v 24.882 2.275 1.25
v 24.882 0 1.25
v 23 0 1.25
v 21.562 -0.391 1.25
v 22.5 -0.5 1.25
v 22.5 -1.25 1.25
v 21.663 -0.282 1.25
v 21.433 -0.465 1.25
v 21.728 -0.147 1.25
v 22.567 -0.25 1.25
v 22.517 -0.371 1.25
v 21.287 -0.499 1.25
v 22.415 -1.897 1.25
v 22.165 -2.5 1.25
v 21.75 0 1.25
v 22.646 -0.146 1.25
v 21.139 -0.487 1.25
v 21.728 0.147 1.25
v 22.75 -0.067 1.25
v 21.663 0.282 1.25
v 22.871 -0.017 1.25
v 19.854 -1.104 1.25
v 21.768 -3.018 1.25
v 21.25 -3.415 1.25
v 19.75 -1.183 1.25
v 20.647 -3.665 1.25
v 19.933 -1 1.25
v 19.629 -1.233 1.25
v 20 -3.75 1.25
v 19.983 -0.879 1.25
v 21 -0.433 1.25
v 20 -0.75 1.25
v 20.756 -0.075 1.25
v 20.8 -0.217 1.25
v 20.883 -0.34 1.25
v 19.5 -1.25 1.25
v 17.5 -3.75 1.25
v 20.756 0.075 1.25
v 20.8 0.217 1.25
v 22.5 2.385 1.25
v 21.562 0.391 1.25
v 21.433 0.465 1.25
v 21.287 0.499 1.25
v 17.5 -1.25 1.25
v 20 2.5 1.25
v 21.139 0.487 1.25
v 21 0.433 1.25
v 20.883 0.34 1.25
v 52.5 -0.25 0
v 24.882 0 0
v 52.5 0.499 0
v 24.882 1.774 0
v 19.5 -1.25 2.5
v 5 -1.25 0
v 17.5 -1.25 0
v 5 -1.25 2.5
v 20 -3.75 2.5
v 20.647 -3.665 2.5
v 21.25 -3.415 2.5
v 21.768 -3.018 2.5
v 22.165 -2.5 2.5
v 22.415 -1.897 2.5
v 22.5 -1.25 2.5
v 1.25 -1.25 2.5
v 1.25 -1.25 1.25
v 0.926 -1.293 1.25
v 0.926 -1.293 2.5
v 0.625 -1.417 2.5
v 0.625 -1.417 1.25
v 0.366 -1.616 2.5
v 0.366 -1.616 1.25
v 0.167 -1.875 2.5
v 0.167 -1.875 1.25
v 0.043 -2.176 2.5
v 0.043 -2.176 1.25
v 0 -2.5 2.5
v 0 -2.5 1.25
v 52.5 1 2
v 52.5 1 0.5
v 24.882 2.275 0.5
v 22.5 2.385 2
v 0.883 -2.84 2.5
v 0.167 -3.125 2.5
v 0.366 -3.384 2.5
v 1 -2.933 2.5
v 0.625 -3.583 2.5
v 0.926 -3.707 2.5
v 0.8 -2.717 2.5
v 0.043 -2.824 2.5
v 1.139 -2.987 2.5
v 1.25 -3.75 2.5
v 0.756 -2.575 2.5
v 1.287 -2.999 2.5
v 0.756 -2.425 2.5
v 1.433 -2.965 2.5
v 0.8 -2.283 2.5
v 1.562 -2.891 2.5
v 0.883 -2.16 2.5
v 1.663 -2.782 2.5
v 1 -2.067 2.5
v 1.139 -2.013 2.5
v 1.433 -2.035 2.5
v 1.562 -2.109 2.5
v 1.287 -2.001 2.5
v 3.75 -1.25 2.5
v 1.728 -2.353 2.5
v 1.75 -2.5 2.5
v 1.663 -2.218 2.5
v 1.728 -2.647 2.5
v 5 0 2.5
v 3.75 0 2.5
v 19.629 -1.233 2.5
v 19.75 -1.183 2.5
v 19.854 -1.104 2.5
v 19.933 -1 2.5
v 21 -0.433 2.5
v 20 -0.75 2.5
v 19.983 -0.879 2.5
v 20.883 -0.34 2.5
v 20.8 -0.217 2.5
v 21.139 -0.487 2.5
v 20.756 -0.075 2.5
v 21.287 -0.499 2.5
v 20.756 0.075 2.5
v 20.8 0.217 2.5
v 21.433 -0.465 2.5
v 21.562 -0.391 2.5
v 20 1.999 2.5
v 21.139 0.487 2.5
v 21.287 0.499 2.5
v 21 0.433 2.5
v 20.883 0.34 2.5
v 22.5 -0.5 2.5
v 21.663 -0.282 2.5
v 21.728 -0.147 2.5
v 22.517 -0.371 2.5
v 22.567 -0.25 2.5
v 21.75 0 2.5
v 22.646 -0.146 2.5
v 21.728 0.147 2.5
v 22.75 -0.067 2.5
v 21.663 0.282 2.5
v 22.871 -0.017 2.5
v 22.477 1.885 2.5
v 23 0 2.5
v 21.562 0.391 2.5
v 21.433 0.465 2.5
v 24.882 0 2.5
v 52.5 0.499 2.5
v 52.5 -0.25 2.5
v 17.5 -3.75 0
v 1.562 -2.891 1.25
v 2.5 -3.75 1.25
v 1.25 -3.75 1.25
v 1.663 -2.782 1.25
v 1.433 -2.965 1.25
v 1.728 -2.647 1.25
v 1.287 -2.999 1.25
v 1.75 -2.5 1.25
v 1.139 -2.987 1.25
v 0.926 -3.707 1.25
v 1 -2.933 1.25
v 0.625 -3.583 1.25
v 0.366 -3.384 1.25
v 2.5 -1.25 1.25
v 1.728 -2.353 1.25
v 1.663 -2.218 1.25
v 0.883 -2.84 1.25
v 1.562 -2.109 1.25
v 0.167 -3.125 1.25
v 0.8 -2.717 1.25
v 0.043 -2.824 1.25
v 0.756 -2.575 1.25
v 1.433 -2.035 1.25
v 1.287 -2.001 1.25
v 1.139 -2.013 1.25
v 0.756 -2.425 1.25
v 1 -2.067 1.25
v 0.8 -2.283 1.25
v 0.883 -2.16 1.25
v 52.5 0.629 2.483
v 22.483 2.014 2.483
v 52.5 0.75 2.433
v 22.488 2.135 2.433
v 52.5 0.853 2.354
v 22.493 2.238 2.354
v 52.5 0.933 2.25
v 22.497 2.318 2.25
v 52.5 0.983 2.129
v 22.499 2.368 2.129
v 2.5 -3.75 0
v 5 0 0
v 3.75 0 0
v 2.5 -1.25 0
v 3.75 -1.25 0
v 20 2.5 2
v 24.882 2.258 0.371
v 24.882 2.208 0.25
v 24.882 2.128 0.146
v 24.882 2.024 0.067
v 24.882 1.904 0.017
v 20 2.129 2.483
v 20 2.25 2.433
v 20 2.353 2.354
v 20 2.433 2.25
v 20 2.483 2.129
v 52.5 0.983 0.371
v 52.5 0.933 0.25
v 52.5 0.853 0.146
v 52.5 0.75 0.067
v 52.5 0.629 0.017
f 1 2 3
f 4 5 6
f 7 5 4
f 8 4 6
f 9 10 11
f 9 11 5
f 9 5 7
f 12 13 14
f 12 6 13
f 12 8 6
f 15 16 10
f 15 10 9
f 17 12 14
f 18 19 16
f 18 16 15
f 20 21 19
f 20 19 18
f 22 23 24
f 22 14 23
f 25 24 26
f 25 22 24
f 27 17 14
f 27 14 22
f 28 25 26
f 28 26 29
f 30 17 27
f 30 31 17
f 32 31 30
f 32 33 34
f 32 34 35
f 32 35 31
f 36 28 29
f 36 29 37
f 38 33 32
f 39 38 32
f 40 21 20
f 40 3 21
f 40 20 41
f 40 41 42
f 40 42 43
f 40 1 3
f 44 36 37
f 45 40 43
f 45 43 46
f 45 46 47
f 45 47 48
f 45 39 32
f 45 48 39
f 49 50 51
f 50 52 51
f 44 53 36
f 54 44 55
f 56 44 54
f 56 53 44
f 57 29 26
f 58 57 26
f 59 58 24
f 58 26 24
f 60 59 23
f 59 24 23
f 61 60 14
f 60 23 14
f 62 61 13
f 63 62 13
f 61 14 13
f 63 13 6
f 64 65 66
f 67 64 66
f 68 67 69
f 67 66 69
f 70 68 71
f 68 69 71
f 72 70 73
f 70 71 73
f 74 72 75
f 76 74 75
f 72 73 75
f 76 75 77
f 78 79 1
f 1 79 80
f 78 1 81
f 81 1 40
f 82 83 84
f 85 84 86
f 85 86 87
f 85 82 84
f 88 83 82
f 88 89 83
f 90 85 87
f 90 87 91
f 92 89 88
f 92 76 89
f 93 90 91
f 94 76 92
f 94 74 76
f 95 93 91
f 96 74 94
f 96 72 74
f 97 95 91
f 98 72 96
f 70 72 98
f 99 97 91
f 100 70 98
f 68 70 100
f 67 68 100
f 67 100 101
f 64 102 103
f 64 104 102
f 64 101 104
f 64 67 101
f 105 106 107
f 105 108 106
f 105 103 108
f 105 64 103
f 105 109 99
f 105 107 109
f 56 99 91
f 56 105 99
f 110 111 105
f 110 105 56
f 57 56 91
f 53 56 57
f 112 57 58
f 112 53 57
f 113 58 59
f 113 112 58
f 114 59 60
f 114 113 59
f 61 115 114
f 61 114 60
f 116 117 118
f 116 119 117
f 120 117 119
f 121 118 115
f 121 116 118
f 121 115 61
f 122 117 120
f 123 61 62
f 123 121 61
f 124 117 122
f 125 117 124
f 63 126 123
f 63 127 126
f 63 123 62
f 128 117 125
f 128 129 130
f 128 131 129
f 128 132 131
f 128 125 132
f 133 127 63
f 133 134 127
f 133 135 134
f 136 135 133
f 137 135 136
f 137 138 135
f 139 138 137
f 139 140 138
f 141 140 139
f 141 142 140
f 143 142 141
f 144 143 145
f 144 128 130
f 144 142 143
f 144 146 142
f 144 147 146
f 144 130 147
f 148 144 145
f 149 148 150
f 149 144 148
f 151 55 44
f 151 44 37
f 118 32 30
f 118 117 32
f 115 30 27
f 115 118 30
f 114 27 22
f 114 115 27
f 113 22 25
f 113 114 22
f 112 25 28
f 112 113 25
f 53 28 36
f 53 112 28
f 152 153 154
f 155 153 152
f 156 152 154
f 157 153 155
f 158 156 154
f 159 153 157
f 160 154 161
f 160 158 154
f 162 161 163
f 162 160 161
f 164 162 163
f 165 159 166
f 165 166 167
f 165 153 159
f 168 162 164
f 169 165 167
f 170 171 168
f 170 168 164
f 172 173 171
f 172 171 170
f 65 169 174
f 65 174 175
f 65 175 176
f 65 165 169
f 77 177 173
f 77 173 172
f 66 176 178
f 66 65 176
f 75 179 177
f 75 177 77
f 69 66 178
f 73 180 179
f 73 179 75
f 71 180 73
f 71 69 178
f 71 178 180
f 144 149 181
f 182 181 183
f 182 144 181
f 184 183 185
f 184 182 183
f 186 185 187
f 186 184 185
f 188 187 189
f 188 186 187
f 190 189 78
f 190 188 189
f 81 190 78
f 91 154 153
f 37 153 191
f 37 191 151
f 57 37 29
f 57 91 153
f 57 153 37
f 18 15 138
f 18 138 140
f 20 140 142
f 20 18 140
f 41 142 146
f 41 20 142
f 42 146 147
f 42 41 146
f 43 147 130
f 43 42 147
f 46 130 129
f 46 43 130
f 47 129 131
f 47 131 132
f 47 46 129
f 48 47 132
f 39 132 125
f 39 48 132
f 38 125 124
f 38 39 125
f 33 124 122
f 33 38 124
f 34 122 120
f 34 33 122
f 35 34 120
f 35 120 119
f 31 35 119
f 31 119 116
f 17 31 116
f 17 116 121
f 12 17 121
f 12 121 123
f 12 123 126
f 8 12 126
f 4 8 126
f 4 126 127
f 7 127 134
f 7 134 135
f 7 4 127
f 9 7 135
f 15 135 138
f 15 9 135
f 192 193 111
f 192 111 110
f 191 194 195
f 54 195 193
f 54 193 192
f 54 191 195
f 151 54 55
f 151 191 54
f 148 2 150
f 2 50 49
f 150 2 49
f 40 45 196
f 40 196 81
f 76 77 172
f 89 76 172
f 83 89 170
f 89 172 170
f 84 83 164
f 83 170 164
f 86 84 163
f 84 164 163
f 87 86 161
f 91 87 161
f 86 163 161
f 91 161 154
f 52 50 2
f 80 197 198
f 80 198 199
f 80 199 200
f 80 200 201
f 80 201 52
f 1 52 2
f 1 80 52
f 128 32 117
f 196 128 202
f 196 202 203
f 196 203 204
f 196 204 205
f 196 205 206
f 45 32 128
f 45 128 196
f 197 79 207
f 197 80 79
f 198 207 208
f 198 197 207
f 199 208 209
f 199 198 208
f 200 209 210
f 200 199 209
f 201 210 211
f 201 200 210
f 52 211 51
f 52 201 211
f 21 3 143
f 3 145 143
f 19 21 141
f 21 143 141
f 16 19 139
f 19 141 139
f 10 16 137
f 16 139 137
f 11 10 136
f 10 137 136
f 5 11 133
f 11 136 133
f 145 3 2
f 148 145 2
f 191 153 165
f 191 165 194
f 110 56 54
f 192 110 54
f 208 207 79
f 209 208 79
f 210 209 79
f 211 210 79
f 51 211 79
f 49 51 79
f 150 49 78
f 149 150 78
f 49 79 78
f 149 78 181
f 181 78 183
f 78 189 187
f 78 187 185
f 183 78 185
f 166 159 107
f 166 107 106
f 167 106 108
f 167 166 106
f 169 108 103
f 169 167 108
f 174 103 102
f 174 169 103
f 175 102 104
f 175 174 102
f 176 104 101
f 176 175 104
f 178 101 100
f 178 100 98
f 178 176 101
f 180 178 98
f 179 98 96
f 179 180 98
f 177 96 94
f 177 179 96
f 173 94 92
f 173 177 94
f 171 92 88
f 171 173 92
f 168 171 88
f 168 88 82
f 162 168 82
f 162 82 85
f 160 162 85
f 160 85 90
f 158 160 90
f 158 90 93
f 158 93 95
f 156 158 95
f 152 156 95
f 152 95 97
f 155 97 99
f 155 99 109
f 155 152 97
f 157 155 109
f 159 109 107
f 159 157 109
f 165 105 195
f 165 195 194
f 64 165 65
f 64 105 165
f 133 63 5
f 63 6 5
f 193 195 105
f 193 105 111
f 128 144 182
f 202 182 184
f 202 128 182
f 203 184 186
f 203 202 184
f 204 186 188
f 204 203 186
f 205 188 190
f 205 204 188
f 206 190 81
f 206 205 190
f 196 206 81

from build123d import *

# Parameters (mm, degrees)
BOSS_EXTRUDE1_DEPTH = 2.5
SKETCH2_W           = 2.5
SKETCH2_H           = 6.25
SKETCH2_H_2         = 2.5
CUT_EXTRUDE1_DEPTH  = 1.25
SKETCH3_R           = 0.5
CUT_EXTRUDE2_DEPTH  = 2.25
SKETCH4_W           = 2.5
SKETCH4_H           = 2.5
SKETCH4_R           = 0.5
SKETCH4_H_2         = 6.134615385
BOSS_EXTRUDE2_DEPTH = 1.25
BOSS_EXTRUDE3_DEPTH = 1.25
SKETCH6_W           = 2.5
SKETCH6_H           = 6.25
SKETCH6_H_2         = 2.5
CUT_EXTRUDE3_DEPTH  = 1.25
CUT_EXTRUDE4_DEPTH  = 1.25
CUT_EXTRUDE5_DEPTH  = 1.25
CUT_EXTRUDE6_DEPTH  = 1.25
CUT_EXTRUDE7_DEPTH  = 1.25
CUT_EXTRUDE8_DEPTH  = 1.25
BOSS_EXTRUDE4_DEPTH = 1.25
CUT_EXTRUDE9_DEPTH  = 1.25
FILLET2_R           = 0.5
FILLET3_R           = 0.5
FILLET4_R           = 0.5
CUT_EXTRUDE10_DEPTH = 1.25
SKETCH16_W          = 2.5
SKETCH16_H          = 2.5
BOSS_EXTRUDE5_DEPTH = 1.25
SKETCH17_W          = 27.617920392
SKETCH17_H          = 2.5
BOSS_EXTRUDE6_DEPTH = 0.25
CUT_EXTRUDE11_DEPTH = 3.5
SKETCH19_W          = 1.25
SKETCH19_H          = 1.25
CUT_EXTRUDE12_DEPTH = 3.5


with BuildPart() as part:
    # Sketch1 → Boss-Extrude1 (new body)
    with BuildSketch(Plane.XY):
        Polygon((0, -1.25), (0, -3.75), (20, -3.75), (22.5, -3.75), (22.5, 0), (52.5, 0), (52.5, 1), (20, 2.5), (20, 0), (20, -1.25), align=None)
    extrude(amount=BOSS_EXTRUDE1_DEPTH)

    # Sketch2 → Cut-Extrude1 (cut)
    with BuildSketch(Plane.XY.offset(2.5)):
        with Locations((21.25, -0.625)):
            Rectangle(SKETCH2_W, SKETCH2_H)
        with Locations((1.25, -2.5)):
            Rectangle(SKETCH2_W, SKETCH2_H_2)
    extrude(amount=-CUT_EXTRUDE1_DEPTH, mode=Mode.SUBTRACT)

    # Sketch3 → Cut-Extrude2 (cut, through all)
    with BuildSketch(Plane.XY.offset(1.25)):
        with Locations((1.25, -2.5)):
            Circle(SKETCH3_R)
        with Locations((21.25, 0)):
            Circle(SKETCH3_R)
    extrude(amount=-CUT_EXTRUDE2_DEPTH, mode=Mode.SUBTRACT)

    # Sketch4 → Boss-Extrude2 (add)
    with BuildSketch(Plane.XY.offset(1.25)):
        with Locations((1.25, -2.5)):
            Rectangle(SKETCH4_W, SKETCH4_H)
        with Locations((1.25, -2.5)):
            Circle(SKETCH4_R, mode=Mode.SUBTRACT)
        with Locations((21.25, -0.682692308)):
            Rectangle(SKETCH4_W, SKETCH4_H_2)
        with Locations((21.25, 0)):
            Circle(SKETCH4_R, mode=Mode.SUBTRACT)
    extrude(amount=BOSS_EXTRUDE2_DEPTH)

    # Sketch5 → Boss-Extrude3 (add)
    with BuildSketch(Plane.XY.offset(1.25)):
        Polygon((20, 2.384615385), (20, 2.5), (22.5, 2.384615385), align=None)
    extrude(amount=BOSS_EXTRUDE3_DEPTH)

    # Sketch6 → Cut-Extrude3 (cut)
    with BuildSketch(Plane(origin=(0, 0, 0), x_dir=(-1, 0, 0), z_dir=(0, 0, -1))):
        with Locations((-21.25, -0.625)):
            Rectangle(SKETCH6_W, SKETCH6_H)
        with Locations((-1.25, -2.5)):
            Rectangle(SKETCH6_W, SKETCH6_H_2)
    extrude(amount=-CUT_EXTRUDE3_DEPTH, mode=Mode.SUBTRACT)

    # Sketch7 → Cut-Extrude4 (cut)
    with BuildSketch(Plane(origin=(0, 0, 0), x_dir=(-1, 0, 0), z_dir=(0, 0, -1))):
        with BuildLine():
            Line((-2.5, -3.75), (-2.5, -1.25))
            ThreePointArc((-2.5, -1.25), (-3.75, -2.5), (-2.5, -3.75))
        make_face()
    extrude(amount=-CUT_EXTRUDE4_DEPTH, mode=Mode.SUBTRACT)

    # Sketch9 → Cut-Extrude5 (cut)
    with BuildSketch(Plane(origin=(0, 0, 1.25), x_dir=(-1, 0, 0), z_dir=(0, 0, -1))):
        with BuildLine():
            Line((0, -1.25), (-1.25, -1.25))
            ThreePointArc((-1.25, -1.25), (-0.366116524, -1.616116524), (0, -2.5))
            Line((0, -2.5), (0, -1.25))
        make_face()
        with BuildLine():
            Line((0, -3.75), (0, -2.5))
            ThreePointArc((0, -2.5), (-0.366116524, -3.383883476), (-1.25, -3.75))
            Line((-1.25, -3.75), (0, -3.75))
        make_face()
    extrude(amount=-CUT_EXTRUDE5_DEPTH, mode=Mode.SUBTRACT)

    # Sketch10 → Cut-Extrude6 (cut)
    with BuildSketch(Plane(origin=(0, 0, 0), x_dir=(-1, 0, 0), z_dir=(0, 0, -1))):
        with BuildLine():
            Line((-22.5, 2.384615385), (-24.882079608, 2.274673249))
            ThreePointArc((-24.882079608, 2.274673249), (-24.146848631, 0.660005249), (-22.5, 0))
            Line((-22.5, 0), (-22.5, 2.384615385))
        make_face()
        with BuildLine():
            Line((-20, -3.75), (-20, -1.25))
            Line((-20, -1.25), (-17.5, -1.25))
            ThreePointArc((-17.5, -1.25), (-18.232233047, -3.017766953), (-20, -3.75))
        make_face()
    extrude(amount=-CUT_EXTRUDE6_DEPTH, mode=Mode.SUBTRACT)

    # Sketch11 → Cut-Extrude7 (cut)
    with BuildSketch(Plane(origin=(0, 0, 1.25), x_dir=(-1, 0, 0), z_dir=(0, 0, -1))):
        with BuildLine():
            Line((-22.5, -1.25), (-22.5, -3.75))
            Line((-22.5, -3.75), (-20, -3.75))
            ThreePointArc((-20, -3.75), (-21.767766953, -3.017766953), (-22.5, -1.25))
        make_face()
    extrude(amount=-CUT_EXTRUDE7_DEPTH, mode=Mode.SUBTRACT)

    # Sketch12 → Cut-Extrude8 (cut)
    with BuildSketch(Plane(origin=(0, 0, 0), x_dir=(-1, 0, 0), z_dir=(0, 0, -1))):
        with BuildLine():
            Line((-24.882079608, 2.274673249), (-24.882079608, 0))
            Line((-24.882079608, 0), (-22.5, 0))
            ThreePointArc((-22.5, 0), (-24.146848631, 0.660005249), (-24.882079608, 2.274673249))
        make_face()
    extrude(amount=-CUT_EXTRUDE8_DEPTH, mode=Mode.SUBTRACT)

    # Sketch13 → Boss-Extrude4 (add)
    with BuildSketch(Plane(origin=(0, 0, 1.25), x_dir=(-1, 0, 0), z_dir=(0, 0, -1))):
        with BuildLine():
            Line((-2.5, -1.25), (-2, -1.25))
            ThreePointArc((-2, -1.25), (-2.5, -2.5), (-2, -3.75))
            Line((-2, -3.75), (-2.5, -3.75))
            ThreePointArc((-2.5, -3.75), (-3.75, -2.5), (-2.5, -1.25))
        make_face()
    extrude(amount=BOSS_EXTRUDE4_DEPTH)

    # Sketch14 → Cut-Extrude9 (cut)
    with BuildSketch(Plane(origin=(0, 0, 0), x_dir=(-1, 0, 0), z_dir=(0, 0, -1))):
        with BuildLine():
            Line((-17.5, -1.25), (-17.5, -3.75))
            Line((-17.5, -3.75), (-20, -3.75))
            ThreePointArc((-20, -3.75), (-18.232233047, -3.017766953), (-17.5, -1.25))
        make_face()
    extrude(amount=-CUT_EXTRUDE9_DEPTH, mode=Mode.SUBTRACT)

    # Fillet2
    fillet2_edges = [part.edges().sort_by_distance(p)[0] for p in [
        (38.691039804, 1.637336624, 0),
        (36.25, 1.75, 2.5),
    ]]
    fillet(fillet2_edges, radius=FILLET2_R)

    # Fillet3
    fillet3_edges = [part.edges().sort_by_distance(p)[0] for p in [
        (22.5, 0, 1.875),
    ]]
    fillet(fillet3_edges, radius=FILLET3_R)

    # Fillet4
    fillet4_edges = [part.edges().sort_by_distance(p)[0] for p in [
        (20, -1.25, 1.875),
    ]]
    fillet(fillet4_edges, radius=FILLET4_R)

    # Sketch15 → Cut-Extrude10 (cut)
    with BuildSketch(Plane(origin=(0, 0, 0), x_dir=(-1, 0, 0), z_dir=(0, 0, -1))):
        with BuildLine():
            Line((-2.5, -1.25), (-2.5, -2.500000004))
            ThreePointArc((-2.5, -2.500000004), (-2.370364003, -1.826854401), (-2, -1.25))
            Line((-2, -1.25), (-2.5, -1.25))
        make_face()
        with BuildLine():
            Line((-2.5, -3.75), (-2, -3.75))
            ThreePointArc((-2, -3.75), (-2.370364002, -3.173145603), (-2.5, -2.500000004))
            Line((-2.5, -2.500000004), (-2.5, -3.75))
        make_face()
    extrude(amount=-CUT_EXTRUDE10_DEPTH, mode=Mode.SUBTRACT)

    # Sketch16 → Boss-Extrude5 (add)
    with BuildSketch(Plane(origin=(0, -1.25, 0), x_dir=(1, 0, 0), z_dir=(0, 1, 0))):
        with Locations((3.75, -1.25)):
            Rectangle(SKETCH16_W, SKETCH16_H)
    extrude(amount=BOSS_EXTRUDE5_DEPTH)

    # Sketch17 → Boss-Extrude6 (add)
    with BuildSketch(Plane.XZ):
        with Locations((38.691039804, 1.25)):
            Rectangle(SKETCH17_W, SKETCH17_H)
    extrude(amount=BOSS_EXTRUDE6_DEPTH)

    # Sketch18 → Cut-Extrude11 (cut, through all)
    with BuildSketch(Plane(origin=(0, 0, 0), x_dir=(-1, 0, 0), z_dir=(0, 0, -1))):
        Polygon((-24.882079608, 0), (-52.5, -0.25), (-24.882079608, -0.25), align=None)
    extrude(amount=-CUT_EXTRUDE11_DEPTH, mode=Mode.SUBTRACT)

    # Sketch19 → Cut-Extrude12 (cut, through all)
    with BuildSketch(Plane(origin=(0, 0, 0), x_dir=(-1, 0, 0), z_dir=(0, 0, -1))):
        with Locations((-3.125, -0.625)):
            Rectangle(SKETCH19_W, SKETCH19_H)
    extrude(amount=-CUT_EXTRUDE12_DEPTH, mode=Mode.SUBTRACT)


solid = part.part
